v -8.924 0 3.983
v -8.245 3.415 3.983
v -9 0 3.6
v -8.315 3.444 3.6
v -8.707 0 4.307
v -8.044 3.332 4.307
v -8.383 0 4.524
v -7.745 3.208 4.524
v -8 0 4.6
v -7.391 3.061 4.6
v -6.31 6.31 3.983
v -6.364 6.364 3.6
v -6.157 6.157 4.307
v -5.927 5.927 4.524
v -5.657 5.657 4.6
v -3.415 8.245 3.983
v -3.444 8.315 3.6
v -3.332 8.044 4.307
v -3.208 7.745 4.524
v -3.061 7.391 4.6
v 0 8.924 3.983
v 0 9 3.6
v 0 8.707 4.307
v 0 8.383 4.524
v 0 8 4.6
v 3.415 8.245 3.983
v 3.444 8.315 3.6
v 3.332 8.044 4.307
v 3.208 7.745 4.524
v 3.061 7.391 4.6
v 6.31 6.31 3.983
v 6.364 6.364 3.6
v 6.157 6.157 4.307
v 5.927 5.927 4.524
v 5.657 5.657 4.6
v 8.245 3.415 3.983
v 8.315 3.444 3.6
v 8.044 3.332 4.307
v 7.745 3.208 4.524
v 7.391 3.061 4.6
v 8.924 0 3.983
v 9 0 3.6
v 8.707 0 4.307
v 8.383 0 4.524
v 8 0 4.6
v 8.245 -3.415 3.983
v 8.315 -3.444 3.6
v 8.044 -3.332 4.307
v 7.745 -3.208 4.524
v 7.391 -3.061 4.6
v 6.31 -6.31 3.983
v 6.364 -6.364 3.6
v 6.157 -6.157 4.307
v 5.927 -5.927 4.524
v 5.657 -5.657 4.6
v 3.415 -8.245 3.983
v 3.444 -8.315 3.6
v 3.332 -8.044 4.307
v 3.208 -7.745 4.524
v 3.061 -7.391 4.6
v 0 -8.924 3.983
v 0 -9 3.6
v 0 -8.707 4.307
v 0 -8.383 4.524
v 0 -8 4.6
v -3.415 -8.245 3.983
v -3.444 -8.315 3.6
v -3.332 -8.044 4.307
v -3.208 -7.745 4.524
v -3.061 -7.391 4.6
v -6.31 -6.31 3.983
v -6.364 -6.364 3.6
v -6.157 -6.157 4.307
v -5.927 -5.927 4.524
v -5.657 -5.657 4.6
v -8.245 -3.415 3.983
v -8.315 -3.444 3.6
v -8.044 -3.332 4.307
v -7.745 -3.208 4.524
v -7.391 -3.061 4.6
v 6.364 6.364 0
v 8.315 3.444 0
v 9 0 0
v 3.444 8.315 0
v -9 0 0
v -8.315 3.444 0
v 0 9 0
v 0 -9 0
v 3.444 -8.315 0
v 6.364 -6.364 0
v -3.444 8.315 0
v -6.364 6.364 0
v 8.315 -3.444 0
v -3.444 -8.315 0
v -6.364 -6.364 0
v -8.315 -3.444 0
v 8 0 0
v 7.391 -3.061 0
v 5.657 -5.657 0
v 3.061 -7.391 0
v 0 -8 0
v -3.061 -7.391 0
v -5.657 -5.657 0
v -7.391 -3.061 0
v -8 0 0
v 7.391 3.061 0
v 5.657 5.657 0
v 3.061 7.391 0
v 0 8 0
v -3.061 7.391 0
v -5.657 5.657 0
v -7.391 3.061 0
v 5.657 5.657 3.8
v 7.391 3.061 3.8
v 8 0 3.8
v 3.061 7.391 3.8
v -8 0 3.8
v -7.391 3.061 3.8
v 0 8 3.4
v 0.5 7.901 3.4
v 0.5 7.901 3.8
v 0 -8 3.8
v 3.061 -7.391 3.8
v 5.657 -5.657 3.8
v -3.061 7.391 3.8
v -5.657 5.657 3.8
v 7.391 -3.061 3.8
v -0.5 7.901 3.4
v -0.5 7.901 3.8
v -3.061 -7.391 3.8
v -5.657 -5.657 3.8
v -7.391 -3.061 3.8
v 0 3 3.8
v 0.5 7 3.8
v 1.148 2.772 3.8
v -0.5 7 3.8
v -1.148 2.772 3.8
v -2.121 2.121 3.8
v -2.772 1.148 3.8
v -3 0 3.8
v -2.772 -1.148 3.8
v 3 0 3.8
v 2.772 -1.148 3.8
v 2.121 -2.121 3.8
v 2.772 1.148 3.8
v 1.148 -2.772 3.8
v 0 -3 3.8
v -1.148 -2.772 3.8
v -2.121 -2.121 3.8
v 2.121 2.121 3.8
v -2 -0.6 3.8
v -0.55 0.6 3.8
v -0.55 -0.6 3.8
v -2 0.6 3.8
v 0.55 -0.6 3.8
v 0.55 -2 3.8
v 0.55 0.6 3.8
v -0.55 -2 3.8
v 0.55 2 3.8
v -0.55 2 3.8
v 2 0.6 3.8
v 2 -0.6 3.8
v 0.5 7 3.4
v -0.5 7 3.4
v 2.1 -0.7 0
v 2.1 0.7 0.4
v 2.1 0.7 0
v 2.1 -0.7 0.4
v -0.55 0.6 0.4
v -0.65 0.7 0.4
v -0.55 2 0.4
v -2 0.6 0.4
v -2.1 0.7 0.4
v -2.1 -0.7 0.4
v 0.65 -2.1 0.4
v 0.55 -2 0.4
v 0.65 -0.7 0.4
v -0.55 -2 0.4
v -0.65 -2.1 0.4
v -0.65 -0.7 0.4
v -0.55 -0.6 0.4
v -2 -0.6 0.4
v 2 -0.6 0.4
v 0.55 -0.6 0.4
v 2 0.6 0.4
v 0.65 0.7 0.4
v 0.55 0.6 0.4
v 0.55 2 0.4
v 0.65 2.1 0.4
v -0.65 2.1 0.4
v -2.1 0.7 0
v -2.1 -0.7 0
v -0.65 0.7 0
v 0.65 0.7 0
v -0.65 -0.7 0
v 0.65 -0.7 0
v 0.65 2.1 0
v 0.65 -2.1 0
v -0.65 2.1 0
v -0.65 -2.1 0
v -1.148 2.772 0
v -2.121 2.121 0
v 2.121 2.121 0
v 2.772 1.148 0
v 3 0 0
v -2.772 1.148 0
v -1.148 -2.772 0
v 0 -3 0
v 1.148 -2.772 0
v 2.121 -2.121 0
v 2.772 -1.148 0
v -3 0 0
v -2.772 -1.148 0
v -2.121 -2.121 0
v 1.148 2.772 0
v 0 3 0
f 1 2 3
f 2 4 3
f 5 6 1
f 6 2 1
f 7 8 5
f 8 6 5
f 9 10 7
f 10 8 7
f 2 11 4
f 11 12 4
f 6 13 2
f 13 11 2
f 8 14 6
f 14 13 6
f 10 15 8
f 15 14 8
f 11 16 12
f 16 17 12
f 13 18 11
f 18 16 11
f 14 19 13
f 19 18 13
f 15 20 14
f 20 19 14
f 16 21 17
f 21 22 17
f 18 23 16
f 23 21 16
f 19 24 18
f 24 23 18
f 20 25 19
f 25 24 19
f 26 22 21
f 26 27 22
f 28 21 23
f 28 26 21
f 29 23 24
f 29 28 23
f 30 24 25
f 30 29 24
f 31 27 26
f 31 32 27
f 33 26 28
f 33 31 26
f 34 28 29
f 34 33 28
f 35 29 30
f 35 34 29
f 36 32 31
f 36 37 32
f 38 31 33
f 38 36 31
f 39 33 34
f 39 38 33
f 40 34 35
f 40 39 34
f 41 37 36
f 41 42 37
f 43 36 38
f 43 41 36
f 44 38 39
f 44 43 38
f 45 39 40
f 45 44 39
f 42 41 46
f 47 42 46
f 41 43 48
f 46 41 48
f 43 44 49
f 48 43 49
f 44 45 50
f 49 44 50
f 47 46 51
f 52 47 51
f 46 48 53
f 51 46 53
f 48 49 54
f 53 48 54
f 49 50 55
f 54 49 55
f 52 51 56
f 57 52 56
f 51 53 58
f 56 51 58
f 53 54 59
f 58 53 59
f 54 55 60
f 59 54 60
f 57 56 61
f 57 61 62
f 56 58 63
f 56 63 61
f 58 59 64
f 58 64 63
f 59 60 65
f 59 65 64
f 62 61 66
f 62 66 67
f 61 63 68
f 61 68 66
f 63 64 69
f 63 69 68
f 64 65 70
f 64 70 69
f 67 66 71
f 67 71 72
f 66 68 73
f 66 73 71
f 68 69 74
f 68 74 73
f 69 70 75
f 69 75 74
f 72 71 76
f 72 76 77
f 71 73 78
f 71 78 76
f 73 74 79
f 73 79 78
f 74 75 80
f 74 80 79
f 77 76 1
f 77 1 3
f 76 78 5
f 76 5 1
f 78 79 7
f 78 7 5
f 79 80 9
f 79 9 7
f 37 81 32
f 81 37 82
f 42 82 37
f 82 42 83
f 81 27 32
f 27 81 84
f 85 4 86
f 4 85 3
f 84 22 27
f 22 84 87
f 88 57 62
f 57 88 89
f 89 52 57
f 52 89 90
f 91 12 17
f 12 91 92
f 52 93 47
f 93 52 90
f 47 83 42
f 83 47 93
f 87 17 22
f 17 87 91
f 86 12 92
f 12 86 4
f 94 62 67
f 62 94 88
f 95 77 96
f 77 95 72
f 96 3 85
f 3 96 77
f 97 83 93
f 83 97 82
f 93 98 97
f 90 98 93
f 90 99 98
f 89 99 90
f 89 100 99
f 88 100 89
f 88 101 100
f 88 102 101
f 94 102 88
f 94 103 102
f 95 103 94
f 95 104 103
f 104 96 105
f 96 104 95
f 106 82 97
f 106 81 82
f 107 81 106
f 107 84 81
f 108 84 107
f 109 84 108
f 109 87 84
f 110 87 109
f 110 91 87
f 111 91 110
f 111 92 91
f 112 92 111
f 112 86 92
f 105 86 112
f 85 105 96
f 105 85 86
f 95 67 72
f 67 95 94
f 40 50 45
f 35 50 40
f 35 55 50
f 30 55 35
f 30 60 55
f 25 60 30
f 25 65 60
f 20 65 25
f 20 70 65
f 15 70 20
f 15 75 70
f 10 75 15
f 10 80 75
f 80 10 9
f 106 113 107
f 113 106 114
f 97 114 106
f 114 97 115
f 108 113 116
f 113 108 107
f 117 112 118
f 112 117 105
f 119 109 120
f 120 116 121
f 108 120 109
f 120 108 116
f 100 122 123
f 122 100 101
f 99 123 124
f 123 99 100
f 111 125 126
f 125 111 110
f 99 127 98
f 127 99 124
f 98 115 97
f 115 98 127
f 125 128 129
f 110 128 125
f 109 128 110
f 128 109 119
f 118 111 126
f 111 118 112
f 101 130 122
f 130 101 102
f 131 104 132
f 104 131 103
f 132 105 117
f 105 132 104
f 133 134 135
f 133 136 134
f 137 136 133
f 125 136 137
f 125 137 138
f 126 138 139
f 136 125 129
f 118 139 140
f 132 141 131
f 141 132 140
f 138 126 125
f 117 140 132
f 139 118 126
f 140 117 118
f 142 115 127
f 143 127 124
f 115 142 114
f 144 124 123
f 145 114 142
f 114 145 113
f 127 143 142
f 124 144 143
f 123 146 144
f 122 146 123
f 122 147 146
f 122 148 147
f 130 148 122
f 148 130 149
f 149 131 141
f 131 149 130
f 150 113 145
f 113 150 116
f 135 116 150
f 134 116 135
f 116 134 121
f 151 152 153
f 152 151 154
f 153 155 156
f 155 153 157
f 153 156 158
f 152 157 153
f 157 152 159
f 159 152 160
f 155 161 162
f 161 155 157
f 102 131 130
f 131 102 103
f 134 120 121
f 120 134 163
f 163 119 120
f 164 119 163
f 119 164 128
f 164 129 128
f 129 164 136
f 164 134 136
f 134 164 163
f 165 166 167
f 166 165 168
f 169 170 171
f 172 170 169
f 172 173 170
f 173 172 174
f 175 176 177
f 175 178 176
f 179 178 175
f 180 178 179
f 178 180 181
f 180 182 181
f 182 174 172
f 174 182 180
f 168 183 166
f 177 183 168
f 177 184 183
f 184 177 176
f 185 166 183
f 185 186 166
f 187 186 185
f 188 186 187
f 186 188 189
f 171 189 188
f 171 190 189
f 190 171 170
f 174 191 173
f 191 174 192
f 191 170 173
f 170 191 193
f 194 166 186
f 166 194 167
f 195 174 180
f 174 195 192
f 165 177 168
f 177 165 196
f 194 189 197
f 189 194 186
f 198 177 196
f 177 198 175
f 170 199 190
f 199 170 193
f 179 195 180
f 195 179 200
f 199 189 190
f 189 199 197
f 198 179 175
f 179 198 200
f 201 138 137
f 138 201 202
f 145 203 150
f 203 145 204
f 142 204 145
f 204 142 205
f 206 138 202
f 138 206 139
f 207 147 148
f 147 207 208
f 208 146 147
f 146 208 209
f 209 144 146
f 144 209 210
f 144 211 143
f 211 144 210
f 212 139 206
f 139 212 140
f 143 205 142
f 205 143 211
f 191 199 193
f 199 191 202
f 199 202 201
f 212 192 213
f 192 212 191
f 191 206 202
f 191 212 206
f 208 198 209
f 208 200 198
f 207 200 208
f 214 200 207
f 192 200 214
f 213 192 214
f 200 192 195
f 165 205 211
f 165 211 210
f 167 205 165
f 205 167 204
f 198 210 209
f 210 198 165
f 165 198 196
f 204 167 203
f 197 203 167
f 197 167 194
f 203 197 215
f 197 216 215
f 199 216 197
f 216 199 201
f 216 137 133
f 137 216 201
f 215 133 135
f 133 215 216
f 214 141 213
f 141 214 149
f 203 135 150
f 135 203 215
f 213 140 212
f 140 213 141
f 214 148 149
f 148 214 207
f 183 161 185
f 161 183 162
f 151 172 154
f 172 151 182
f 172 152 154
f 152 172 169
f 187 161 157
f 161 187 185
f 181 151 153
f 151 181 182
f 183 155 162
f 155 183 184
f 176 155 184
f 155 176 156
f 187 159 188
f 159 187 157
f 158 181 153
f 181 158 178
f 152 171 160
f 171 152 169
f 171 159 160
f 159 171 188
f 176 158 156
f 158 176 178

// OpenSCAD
// file: ../stems/cherry.scad
// origin about center of top of stem

module CherryStem (
	height,
	radius,
	armXWidth, // arm parallel to x axis
	armYWidth, // arm parallel to y axis
	armLength,
	openingTolerance = 0,
	openingHeight = .4
) {
	translate([0, 0, -height / 2])
		difference() {
			cylinder(r = radius, h = height, center = true);
			cube([armLength, armXWidth, height + 1], true);
			cube([armYWidth, armLength, height + 1], true);
			translate([0, 0, -height / 2]) {
				cube([armLength + openingTolerance, armXWidth + openingTolerance, openingHeight * 2], true);
				cube([armYWidth + openingTolerance, armLength + openingTolerance, openingHeight * 2], true);
			}
		}
};
// file: ../caps/round.scad
// centered about center of bottom of key

module RoundCap (
	bevelRadius,
	height,
	sideWallWidth,
	topWallHeight,
	depth,
	width,
	withOrienter = true,
	footprintOnly = true
) {
	orienterHeight = .4;
	orienterWidth = 1;
	orienterDepth = 1;
	difference() {
		union() {
			translate([0, 0, height - bevelRadius])
				rotate_extrude()
						translate([depth / 2 - bevelRadius, 0, 0])
								circle(r = bevelRadius);
			translate([0, 0, (height - bevelRadius) / 2]) {
				cylinder(r = depth / 2, h = height - bevelRadius, center = true);
			}
			translate([0, 0, height - bevelRadius / 2]) {
				cylinder(r = depth / 2 - bevelRadius, h = bevelRadius, center = true);
			}
		}
		translate([0, 0, height / 2 - topWallHeight]) {
			cylinder(r = depth / 2 - sideWallWidth, h = height, center = true);
		}
	}
	if (withOrienter) {
		translate([0, depth / 2 - sideWallWidth - orienterDepth / 2, height - topWallHeight - orienterHeight / 2])
			cube([orienterWidth, orienterDepth, orienterHeight], true);
	}
};
// main file
use <../caps/round.scad>
use <../stems/cherry.scad>

$fn = $preview ? 8 : 16;

height = 4.6;
topWallHeight = .8;

RoundCap (
	bevelRadius = 1,
	height = height,
	sideWallWidth = 1,
	topWallHeight = topWallHeight,
	depth = 18,
	width = 18
);

translate([0, 0, height - topWallHeight]) CherryStem(
	height = height - topWallHeight,
	radius = 3, 
	armLength = 4, 
	armXWidth = 1.2, 
	armYWidth = 1.1, 
	openingTolerance = .2
);
